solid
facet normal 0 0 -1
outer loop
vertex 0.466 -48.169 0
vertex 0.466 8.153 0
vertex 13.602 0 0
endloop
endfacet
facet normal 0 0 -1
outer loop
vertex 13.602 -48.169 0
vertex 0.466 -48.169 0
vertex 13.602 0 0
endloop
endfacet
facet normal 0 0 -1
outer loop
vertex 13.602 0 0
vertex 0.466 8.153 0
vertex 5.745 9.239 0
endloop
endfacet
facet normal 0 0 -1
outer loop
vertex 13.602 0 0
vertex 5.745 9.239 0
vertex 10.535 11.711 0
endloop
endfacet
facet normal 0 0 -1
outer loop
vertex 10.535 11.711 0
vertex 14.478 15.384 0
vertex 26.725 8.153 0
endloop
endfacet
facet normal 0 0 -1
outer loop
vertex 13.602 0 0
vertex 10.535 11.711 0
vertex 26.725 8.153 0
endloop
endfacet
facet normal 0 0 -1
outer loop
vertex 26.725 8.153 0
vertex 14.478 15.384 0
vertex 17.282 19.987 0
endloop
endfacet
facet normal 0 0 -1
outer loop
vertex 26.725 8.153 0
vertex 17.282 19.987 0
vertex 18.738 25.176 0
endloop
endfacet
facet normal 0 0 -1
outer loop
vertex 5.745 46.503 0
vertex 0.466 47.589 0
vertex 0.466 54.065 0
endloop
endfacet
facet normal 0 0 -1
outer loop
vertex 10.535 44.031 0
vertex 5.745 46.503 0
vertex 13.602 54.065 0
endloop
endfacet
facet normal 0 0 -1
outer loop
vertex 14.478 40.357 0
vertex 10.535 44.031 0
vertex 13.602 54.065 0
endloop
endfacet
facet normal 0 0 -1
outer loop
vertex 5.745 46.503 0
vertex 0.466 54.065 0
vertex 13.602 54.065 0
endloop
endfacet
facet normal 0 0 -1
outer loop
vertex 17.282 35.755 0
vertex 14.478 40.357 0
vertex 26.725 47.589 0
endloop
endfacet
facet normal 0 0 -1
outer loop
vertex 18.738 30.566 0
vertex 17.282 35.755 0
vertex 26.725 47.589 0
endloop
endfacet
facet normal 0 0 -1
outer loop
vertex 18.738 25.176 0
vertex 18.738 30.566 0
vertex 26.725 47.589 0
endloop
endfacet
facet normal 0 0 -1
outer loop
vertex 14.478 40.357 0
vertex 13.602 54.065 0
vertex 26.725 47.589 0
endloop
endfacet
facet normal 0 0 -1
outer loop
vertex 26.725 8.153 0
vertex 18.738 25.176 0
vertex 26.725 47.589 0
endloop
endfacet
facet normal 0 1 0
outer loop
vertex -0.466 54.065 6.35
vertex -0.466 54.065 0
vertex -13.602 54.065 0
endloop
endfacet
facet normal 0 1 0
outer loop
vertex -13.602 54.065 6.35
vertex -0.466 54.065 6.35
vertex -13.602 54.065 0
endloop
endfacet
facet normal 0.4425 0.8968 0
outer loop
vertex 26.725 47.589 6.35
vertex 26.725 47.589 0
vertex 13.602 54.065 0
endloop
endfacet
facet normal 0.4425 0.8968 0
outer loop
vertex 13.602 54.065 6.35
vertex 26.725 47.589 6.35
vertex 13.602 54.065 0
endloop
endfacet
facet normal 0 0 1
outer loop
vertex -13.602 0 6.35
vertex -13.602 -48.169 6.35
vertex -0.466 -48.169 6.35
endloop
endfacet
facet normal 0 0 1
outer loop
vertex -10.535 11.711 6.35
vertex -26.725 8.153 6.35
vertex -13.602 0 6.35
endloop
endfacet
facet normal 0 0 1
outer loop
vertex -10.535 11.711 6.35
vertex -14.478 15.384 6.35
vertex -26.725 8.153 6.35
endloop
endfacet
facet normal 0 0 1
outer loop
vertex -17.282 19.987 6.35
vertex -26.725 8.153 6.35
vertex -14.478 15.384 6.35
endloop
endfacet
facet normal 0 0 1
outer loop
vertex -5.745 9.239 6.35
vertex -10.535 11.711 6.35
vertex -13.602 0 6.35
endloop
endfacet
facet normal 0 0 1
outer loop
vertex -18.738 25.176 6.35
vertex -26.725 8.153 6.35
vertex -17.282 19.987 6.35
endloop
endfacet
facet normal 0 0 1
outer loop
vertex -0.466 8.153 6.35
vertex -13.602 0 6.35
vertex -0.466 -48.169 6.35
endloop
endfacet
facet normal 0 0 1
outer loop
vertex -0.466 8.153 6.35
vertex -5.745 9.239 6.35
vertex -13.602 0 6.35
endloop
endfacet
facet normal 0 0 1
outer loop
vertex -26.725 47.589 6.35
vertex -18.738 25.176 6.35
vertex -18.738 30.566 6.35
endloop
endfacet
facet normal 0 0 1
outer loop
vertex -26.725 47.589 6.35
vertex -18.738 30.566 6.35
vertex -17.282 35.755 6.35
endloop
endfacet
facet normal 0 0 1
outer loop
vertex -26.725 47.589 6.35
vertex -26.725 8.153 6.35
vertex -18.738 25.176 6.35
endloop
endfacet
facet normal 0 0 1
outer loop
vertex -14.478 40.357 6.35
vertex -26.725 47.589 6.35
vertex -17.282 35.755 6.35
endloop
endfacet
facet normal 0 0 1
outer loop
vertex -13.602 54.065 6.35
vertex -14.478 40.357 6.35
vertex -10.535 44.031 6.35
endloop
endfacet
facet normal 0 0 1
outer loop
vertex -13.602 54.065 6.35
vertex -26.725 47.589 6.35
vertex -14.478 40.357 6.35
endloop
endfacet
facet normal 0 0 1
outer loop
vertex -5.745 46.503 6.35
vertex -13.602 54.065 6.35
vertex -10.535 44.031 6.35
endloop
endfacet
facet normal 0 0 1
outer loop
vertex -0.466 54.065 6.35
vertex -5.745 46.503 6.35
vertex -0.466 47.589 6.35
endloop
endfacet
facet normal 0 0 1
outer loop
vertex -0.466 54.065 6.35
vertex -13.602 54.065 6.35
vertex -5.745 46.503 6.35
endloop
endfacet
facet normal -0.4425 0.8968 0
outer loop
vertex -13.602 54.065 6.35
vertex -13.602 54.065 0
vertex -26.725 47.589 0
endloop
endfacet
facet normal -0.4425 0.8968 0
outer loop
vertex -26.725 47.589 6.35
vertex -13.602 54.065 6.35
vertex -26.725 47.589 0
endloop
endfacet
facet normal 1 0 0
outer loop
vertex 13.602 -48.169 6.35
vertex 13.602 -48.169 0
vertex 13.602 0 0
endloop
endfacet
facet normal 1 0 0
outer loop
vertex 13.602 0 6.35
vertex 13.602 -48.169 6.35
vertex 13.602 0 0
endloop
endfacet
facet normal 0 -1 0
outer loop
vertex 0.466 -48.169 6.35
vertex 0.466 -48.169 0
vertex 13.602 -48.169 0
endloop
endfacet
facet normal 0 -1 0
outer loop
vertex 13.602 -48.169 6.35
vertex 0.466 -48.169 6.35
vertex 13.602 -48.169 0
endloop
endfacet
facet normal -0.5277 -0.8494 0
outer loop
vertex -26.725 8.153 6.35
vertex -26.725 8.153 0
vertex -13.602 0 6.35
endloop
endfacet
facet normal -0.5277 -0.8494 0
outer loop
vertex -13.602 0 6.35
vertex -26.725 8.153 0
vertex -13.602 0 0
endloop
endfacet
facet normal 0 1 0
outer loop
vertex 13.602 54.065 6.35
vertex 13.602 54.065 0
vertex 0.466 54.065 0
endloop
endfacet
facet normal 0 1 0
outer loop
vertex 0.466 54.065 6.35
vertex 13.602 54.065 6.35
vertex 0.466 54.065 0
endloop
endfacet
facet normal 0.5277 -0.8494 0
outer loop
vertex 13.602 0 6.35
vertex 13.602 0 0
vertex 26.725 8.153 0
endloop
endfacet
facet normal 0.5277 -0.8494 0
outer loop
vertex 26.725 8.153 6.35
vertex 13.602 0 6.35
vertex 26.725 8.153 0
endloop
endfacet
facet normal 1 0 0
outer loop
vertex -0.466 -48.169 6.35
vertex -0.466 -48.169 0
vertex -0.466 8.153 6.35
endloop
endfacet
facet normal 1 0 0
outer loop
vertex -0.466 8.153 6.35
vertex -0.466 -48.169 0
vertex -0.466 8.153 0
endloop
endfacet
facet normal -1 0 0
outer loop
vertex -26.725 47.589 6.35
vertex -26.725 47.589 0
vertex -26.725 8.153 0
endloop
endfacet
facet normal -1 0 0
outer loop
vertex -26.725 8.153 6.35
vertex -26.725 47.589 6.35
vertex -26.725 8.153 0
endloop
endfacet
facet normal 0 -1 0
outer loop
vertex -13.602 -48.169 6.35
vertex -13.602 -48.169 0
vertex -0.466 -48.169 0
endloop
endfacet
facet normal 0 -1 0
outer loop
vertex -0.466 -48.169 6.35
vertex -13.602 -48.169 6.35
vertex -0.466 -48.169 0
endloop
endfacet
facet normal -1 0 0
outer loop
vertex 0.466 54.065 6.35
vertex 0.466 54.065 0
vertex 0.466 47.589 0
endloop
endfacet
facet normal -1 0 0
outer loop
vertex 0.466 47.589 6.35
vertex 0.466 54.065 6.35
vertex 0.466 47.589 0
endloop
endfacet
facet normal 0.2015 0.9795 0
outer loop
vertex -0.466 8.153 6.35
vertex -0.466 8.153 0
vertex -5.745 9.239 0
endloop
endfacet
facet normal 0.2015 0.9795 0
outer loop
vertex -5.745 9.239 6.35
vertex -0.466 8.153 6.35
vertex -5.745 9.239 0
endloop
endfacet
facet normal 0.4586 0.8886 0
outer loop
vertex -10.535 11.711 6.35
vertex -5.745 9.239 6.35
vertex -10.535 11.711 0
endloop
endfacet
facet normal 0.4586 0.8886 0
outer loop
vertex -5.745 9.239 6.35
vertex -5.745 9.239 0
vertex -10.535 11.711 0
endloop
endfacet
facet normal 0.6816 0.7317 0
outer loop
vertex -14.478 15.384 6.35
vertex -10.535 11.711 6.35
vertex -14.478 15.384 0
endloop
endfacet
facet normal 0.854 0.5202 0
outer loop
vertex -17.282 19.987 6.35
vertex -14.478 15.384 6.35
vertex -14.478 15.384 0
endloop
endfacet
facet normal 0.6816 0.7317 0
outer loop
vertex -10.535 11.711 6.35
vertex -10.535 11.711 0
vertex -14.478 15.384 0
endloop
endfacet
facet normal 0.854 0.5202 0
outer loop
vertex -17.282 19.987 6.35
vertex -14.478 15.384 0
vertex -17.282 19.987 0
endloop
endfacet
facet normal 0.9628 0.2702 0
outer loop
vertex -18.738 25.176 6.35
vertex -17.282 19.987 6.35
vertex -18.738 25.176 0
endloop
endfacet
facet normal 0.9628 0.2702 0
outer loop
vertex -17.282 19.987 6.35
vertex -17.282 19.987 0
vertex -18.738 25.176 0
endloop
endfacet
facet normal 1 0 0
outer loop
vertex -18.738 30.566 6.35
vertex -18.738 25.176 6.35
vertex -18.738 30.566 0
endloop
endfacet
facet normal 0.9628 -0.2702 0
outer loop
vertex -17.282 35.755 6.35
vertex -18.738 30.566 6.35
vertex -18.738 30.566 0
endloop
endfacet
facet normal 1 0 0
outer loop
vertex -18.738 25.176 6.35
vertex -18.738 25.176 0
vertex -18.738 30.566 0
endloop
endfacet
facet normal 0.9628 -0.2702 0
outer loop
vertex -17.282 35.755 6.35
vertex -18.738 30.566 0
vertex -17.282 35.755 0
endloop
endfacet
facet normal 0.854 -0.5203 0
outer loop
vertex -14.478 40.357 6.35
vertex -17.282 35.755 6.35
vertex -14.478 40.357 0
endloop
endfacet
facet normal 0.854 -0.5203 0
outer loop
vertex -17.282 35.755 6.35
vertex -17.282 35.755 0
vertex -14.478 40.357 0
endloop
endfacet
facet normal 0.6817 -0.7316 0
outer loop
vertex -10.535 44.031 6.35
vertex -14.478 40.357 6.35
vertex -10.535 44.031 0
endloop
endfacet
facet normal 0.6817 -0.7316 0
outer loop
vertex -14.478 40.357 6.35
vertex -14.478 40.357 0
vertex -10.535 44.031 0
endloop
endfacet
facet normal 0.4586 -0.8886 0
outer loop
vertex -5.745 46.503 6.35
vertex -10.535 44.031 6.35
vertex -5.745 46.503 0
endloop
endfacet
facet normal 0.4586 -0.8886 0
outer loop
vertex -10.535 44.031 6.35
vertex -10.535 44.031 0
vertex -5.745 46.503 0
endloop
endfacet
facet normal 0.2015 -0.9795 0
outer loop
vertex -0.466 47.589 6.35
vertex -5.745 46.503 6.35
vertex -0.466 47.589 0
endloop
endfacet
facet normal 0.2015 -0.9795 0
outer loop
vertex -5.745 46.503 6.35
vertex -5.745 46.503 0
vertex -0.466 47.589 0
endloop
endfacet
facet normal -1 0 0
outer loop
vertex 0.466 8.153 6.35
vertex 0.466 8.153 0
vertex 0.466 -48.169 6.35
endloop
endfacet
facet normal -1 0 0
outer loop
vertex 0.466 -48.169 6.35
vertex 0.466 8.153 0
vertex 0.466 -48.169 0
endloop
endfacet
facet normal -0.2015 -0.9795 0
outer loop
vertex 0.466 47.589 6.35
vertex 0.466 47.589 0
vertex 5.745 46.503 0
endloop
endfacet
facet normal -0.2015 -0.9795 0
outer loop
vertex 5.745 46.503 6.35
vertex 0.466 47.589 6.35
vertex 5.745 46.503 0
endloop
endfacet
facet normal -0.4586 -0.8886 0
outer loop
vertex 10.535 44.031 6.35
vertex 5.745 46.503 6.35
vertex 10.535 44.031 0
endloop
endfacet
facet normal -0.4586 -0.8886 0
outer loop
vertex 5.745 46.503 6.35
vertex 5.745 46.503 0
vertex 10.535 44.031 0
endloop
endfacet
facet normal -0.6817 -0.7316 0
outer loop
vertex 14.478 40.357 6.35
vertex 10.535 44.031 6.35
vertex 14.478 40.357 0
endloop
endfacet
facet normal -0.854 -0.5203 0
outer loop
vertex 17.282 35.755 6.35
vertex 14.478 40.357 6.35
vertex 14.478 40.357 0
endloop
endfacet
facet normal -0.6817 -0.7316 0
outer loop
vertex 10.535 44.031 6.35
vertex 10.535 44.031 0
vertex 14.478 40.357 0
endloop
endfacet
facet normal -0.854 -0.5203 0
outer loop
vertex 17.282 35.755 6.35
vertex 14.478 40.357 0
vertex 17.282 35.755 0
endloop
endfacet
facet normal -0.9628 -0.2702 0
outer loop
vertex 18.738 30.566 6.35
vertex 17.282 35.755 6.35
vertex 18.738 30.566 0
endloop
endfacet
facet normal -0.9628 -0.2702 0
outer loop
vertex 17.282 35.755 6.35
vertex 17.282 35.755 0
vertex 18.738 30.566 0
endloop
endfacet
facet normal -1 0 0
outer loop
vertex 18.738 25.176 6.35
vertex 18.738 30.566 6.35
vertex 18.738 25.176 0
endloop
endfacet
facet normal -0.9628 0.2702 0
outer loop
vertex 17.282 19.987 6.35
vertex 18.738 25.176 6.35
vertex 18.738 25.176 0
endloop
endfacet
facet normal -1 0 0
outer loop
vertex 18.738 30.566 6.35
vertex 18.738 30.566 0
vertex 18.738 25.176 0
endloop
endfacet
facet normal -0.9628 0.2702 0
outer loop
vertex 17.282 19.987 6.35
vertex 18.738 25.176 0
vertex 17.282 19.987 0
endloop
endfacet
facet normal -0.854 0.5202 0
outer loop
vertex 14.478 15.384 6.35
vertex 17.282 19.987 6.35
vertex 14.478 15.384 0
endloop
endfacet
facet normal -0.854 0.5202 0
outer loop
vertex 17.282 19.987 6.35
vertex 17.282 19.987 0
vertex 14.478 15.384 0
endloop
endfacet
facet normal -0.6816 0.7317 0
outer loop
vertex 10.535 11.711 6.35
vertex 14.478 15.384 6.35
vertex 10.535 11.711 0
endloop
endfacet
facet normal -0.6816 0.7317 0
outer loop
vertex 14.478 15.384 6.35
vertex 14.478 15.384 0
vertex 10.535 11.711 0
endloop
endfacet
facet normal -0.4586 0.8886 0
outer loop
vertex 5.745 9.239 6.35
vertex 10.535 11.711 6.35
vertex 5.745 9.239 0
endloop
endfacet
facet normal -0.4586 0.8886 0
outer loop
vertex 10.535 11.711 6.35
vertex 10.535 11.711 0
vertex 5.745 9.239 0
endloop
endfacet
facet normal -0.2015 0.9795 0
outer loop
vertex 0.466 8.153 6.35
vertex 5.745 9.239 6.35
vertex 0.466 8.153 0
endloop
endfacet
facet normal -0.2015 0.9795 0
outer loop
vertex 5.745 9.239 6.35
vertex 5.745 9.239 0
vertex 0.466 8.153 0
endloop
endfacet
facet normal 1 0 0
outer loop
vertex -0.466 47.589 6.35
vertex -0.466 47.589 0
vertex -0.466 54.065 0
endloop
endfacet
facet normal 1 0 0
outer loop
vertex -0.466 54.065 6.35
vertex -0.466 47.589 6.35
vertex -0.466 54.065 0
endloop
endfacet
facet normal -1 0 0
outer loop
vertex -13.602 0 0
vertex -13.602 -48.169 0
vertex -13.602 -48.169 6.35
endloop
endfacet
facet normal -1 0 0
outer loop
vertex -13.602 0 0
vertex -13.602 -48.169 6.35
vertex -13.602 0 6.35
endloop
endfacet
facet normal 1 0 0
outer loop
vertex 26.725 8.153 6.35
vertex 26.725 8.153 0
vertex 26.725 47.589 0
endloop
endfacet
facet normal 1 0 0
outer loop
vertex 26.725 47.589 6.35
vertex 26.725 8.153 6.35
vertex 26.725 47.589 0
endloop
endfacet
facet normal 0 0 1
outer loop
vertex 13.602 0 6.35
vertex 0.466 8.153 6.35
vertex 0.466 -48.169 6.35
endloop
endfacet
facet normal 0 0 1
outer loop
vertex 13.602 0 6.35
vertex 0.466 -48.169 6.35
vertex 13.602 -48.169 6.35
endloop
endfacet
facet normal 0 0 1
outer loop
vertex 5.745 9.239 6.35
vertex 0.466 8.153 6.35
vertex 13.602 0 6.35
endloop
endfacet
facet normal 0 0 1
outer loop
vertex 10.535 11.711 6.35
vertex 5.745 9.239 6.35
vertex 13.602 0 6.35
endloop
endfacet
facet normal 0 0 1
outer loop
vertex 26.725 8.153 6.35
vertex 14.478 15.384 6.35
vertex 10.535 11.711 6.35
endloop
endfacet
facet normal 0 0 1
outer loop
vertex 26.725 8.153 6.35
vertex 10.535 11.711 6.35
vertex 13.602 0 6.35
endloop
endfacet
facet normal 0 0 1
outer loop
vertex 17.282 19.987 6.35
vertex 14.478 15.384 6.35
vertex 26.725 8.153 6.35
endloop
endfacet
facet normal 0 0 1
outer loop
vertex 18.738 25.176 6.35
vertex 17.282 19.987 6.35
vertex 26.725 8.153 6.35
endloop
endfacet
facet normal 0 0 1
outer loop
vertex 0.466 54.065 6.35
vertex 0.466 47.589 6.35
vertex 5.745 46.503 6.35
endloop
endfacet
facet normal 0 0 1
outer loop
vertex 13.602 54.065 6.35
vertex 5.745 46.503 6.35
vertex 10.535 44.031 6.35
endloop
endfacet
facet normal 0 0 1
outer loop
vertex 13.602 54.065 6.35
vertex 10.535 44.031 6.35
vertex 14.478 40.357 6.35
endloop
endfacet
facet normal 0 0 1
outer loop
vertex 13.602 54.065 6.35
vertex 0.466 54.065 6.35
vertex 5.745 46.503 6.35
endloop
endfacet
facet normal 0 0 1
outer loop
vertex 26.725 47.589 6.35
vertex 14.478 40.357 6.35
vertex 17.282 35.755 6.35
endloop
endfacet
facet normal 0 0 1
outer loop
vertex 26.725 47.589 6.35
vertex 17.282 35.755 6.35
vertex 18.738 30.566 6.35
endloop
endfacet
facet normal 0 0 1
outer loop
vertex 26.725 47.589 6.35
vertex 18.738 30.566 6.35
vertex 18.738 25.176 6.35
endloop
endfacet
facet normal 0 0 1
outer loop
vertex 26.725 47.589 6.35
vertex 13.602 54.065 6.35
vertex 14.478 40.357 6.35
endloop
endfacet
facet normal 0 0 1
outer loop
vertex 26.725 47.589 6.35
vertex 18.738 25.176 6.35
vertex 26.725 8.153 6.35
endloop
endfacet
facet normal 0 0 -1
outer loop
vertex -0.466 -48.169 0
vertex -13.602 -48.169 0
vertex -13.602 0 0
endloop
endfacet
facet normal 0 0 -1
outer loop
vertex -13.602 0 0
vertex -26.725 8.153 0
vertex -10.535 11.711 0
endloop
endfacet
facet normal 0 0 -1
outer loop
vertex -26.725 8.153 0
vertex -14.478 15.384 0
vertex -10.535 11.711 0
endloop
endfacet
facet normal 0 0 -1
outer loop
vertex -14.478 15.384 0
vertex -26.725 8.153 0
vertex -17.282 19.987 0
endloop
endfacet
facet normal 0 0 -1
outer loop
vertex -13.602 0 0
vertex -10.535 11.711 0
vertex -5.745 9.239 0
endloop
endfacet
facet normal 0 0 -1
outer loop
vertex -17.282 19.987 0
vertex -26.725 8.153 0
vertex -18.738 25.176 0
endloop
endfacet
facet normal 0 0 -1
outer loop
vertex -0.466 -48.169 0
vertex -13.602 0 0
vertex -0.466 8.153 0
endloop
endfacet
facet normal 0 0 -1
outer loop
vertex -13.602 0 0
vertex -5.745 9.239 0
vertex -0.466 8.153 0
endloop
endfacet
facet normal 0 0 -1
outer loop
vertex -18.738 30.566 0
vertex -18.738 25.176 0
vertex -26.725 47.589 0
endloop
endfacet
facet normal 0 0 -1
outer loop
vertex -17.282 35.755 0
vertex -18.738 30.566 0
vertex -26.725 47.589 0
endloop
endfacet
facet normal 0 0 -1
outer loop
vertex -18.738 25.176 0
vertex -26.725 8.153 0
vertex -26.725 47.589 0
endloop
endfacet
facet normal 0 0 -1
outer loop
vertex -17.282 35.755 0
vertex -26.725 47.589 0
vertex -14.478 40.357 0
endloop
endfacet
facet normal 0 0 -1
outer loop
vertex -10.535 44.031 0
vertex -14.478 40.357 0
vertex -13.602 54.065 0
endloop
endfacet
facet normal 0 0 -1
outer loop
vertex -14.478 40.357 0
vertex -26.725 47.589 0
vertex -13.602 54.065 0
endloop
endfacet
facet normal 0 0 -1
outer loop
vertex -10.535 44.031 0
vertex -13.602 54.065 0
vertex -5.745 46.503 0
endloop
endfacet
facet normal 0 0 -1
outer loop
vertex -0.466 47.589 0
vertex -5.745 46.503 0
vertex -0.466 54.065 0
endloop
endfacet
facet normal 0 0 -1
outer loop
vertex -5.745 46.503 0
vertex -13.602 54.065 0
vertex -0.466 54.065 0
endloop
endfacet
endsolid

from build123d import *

# Parameters (mm, degrees)
F0_W     = 13.135664
F0_H     = 48.168876
F1_DEPTH = 6.35


with BuildPart() as f1:
    # F0 (on Top) → F1 (new body)
    with BuildSketch(Plane.XY):
        with BuildLine():
            Line((-13.60173, 0), (-0.466066, 0))
            Line((-0.466066, 0), (-0.466066, 8.153327))
            ThreePointArc((-0.466066, 8.153327), (-18.923, 27.870937), (-0.466066, 47.588548))
            Line((-0.466066, 47.588548), (-0.466066, 54.06511))
            Line((-0.466066, 54.06511), (-13.60173, 54.06511))
            Line((-13.60173, 54.06511), (-26.725137, 47.588548))
            Line((-26.725137, 47.588548), (-26.725137, 8.153327))
            Line((-26.725137, 8.153327), (-13.60173, 0))
        make_face()
        with BuildLine():
            Line((0.466066, 8.153327), (0.466066, 0))
            Line((0.466066, 0), (13.60173, 0))
            Line((13.60173, 0), (26.725137, 8.153327))
            Line((26.725137, 8.153327), (26.725137, 47.588548))
            Line((26.725137, 47.588548), (13.60173, 54.06511))
            Line((13.60173, 54.06511), (0.466066, 54.06511))
            Line((0.466066, 54.06511), (0.466066, 47.588548))
            ThreePointArc((0.466066, 47.588548), (18.923, 27.870937), (0.466066, 8.153327))
        make_face()
        with Locations((7.033898, -24.084438)):
            Rectangle(F0_W, F0_H)
        with Locations((-7.033898, -24.084438)):
            Rectangle(F0_W, F0_H)
    extrude(amount=F1_DEPTH)


solid = f1.part
